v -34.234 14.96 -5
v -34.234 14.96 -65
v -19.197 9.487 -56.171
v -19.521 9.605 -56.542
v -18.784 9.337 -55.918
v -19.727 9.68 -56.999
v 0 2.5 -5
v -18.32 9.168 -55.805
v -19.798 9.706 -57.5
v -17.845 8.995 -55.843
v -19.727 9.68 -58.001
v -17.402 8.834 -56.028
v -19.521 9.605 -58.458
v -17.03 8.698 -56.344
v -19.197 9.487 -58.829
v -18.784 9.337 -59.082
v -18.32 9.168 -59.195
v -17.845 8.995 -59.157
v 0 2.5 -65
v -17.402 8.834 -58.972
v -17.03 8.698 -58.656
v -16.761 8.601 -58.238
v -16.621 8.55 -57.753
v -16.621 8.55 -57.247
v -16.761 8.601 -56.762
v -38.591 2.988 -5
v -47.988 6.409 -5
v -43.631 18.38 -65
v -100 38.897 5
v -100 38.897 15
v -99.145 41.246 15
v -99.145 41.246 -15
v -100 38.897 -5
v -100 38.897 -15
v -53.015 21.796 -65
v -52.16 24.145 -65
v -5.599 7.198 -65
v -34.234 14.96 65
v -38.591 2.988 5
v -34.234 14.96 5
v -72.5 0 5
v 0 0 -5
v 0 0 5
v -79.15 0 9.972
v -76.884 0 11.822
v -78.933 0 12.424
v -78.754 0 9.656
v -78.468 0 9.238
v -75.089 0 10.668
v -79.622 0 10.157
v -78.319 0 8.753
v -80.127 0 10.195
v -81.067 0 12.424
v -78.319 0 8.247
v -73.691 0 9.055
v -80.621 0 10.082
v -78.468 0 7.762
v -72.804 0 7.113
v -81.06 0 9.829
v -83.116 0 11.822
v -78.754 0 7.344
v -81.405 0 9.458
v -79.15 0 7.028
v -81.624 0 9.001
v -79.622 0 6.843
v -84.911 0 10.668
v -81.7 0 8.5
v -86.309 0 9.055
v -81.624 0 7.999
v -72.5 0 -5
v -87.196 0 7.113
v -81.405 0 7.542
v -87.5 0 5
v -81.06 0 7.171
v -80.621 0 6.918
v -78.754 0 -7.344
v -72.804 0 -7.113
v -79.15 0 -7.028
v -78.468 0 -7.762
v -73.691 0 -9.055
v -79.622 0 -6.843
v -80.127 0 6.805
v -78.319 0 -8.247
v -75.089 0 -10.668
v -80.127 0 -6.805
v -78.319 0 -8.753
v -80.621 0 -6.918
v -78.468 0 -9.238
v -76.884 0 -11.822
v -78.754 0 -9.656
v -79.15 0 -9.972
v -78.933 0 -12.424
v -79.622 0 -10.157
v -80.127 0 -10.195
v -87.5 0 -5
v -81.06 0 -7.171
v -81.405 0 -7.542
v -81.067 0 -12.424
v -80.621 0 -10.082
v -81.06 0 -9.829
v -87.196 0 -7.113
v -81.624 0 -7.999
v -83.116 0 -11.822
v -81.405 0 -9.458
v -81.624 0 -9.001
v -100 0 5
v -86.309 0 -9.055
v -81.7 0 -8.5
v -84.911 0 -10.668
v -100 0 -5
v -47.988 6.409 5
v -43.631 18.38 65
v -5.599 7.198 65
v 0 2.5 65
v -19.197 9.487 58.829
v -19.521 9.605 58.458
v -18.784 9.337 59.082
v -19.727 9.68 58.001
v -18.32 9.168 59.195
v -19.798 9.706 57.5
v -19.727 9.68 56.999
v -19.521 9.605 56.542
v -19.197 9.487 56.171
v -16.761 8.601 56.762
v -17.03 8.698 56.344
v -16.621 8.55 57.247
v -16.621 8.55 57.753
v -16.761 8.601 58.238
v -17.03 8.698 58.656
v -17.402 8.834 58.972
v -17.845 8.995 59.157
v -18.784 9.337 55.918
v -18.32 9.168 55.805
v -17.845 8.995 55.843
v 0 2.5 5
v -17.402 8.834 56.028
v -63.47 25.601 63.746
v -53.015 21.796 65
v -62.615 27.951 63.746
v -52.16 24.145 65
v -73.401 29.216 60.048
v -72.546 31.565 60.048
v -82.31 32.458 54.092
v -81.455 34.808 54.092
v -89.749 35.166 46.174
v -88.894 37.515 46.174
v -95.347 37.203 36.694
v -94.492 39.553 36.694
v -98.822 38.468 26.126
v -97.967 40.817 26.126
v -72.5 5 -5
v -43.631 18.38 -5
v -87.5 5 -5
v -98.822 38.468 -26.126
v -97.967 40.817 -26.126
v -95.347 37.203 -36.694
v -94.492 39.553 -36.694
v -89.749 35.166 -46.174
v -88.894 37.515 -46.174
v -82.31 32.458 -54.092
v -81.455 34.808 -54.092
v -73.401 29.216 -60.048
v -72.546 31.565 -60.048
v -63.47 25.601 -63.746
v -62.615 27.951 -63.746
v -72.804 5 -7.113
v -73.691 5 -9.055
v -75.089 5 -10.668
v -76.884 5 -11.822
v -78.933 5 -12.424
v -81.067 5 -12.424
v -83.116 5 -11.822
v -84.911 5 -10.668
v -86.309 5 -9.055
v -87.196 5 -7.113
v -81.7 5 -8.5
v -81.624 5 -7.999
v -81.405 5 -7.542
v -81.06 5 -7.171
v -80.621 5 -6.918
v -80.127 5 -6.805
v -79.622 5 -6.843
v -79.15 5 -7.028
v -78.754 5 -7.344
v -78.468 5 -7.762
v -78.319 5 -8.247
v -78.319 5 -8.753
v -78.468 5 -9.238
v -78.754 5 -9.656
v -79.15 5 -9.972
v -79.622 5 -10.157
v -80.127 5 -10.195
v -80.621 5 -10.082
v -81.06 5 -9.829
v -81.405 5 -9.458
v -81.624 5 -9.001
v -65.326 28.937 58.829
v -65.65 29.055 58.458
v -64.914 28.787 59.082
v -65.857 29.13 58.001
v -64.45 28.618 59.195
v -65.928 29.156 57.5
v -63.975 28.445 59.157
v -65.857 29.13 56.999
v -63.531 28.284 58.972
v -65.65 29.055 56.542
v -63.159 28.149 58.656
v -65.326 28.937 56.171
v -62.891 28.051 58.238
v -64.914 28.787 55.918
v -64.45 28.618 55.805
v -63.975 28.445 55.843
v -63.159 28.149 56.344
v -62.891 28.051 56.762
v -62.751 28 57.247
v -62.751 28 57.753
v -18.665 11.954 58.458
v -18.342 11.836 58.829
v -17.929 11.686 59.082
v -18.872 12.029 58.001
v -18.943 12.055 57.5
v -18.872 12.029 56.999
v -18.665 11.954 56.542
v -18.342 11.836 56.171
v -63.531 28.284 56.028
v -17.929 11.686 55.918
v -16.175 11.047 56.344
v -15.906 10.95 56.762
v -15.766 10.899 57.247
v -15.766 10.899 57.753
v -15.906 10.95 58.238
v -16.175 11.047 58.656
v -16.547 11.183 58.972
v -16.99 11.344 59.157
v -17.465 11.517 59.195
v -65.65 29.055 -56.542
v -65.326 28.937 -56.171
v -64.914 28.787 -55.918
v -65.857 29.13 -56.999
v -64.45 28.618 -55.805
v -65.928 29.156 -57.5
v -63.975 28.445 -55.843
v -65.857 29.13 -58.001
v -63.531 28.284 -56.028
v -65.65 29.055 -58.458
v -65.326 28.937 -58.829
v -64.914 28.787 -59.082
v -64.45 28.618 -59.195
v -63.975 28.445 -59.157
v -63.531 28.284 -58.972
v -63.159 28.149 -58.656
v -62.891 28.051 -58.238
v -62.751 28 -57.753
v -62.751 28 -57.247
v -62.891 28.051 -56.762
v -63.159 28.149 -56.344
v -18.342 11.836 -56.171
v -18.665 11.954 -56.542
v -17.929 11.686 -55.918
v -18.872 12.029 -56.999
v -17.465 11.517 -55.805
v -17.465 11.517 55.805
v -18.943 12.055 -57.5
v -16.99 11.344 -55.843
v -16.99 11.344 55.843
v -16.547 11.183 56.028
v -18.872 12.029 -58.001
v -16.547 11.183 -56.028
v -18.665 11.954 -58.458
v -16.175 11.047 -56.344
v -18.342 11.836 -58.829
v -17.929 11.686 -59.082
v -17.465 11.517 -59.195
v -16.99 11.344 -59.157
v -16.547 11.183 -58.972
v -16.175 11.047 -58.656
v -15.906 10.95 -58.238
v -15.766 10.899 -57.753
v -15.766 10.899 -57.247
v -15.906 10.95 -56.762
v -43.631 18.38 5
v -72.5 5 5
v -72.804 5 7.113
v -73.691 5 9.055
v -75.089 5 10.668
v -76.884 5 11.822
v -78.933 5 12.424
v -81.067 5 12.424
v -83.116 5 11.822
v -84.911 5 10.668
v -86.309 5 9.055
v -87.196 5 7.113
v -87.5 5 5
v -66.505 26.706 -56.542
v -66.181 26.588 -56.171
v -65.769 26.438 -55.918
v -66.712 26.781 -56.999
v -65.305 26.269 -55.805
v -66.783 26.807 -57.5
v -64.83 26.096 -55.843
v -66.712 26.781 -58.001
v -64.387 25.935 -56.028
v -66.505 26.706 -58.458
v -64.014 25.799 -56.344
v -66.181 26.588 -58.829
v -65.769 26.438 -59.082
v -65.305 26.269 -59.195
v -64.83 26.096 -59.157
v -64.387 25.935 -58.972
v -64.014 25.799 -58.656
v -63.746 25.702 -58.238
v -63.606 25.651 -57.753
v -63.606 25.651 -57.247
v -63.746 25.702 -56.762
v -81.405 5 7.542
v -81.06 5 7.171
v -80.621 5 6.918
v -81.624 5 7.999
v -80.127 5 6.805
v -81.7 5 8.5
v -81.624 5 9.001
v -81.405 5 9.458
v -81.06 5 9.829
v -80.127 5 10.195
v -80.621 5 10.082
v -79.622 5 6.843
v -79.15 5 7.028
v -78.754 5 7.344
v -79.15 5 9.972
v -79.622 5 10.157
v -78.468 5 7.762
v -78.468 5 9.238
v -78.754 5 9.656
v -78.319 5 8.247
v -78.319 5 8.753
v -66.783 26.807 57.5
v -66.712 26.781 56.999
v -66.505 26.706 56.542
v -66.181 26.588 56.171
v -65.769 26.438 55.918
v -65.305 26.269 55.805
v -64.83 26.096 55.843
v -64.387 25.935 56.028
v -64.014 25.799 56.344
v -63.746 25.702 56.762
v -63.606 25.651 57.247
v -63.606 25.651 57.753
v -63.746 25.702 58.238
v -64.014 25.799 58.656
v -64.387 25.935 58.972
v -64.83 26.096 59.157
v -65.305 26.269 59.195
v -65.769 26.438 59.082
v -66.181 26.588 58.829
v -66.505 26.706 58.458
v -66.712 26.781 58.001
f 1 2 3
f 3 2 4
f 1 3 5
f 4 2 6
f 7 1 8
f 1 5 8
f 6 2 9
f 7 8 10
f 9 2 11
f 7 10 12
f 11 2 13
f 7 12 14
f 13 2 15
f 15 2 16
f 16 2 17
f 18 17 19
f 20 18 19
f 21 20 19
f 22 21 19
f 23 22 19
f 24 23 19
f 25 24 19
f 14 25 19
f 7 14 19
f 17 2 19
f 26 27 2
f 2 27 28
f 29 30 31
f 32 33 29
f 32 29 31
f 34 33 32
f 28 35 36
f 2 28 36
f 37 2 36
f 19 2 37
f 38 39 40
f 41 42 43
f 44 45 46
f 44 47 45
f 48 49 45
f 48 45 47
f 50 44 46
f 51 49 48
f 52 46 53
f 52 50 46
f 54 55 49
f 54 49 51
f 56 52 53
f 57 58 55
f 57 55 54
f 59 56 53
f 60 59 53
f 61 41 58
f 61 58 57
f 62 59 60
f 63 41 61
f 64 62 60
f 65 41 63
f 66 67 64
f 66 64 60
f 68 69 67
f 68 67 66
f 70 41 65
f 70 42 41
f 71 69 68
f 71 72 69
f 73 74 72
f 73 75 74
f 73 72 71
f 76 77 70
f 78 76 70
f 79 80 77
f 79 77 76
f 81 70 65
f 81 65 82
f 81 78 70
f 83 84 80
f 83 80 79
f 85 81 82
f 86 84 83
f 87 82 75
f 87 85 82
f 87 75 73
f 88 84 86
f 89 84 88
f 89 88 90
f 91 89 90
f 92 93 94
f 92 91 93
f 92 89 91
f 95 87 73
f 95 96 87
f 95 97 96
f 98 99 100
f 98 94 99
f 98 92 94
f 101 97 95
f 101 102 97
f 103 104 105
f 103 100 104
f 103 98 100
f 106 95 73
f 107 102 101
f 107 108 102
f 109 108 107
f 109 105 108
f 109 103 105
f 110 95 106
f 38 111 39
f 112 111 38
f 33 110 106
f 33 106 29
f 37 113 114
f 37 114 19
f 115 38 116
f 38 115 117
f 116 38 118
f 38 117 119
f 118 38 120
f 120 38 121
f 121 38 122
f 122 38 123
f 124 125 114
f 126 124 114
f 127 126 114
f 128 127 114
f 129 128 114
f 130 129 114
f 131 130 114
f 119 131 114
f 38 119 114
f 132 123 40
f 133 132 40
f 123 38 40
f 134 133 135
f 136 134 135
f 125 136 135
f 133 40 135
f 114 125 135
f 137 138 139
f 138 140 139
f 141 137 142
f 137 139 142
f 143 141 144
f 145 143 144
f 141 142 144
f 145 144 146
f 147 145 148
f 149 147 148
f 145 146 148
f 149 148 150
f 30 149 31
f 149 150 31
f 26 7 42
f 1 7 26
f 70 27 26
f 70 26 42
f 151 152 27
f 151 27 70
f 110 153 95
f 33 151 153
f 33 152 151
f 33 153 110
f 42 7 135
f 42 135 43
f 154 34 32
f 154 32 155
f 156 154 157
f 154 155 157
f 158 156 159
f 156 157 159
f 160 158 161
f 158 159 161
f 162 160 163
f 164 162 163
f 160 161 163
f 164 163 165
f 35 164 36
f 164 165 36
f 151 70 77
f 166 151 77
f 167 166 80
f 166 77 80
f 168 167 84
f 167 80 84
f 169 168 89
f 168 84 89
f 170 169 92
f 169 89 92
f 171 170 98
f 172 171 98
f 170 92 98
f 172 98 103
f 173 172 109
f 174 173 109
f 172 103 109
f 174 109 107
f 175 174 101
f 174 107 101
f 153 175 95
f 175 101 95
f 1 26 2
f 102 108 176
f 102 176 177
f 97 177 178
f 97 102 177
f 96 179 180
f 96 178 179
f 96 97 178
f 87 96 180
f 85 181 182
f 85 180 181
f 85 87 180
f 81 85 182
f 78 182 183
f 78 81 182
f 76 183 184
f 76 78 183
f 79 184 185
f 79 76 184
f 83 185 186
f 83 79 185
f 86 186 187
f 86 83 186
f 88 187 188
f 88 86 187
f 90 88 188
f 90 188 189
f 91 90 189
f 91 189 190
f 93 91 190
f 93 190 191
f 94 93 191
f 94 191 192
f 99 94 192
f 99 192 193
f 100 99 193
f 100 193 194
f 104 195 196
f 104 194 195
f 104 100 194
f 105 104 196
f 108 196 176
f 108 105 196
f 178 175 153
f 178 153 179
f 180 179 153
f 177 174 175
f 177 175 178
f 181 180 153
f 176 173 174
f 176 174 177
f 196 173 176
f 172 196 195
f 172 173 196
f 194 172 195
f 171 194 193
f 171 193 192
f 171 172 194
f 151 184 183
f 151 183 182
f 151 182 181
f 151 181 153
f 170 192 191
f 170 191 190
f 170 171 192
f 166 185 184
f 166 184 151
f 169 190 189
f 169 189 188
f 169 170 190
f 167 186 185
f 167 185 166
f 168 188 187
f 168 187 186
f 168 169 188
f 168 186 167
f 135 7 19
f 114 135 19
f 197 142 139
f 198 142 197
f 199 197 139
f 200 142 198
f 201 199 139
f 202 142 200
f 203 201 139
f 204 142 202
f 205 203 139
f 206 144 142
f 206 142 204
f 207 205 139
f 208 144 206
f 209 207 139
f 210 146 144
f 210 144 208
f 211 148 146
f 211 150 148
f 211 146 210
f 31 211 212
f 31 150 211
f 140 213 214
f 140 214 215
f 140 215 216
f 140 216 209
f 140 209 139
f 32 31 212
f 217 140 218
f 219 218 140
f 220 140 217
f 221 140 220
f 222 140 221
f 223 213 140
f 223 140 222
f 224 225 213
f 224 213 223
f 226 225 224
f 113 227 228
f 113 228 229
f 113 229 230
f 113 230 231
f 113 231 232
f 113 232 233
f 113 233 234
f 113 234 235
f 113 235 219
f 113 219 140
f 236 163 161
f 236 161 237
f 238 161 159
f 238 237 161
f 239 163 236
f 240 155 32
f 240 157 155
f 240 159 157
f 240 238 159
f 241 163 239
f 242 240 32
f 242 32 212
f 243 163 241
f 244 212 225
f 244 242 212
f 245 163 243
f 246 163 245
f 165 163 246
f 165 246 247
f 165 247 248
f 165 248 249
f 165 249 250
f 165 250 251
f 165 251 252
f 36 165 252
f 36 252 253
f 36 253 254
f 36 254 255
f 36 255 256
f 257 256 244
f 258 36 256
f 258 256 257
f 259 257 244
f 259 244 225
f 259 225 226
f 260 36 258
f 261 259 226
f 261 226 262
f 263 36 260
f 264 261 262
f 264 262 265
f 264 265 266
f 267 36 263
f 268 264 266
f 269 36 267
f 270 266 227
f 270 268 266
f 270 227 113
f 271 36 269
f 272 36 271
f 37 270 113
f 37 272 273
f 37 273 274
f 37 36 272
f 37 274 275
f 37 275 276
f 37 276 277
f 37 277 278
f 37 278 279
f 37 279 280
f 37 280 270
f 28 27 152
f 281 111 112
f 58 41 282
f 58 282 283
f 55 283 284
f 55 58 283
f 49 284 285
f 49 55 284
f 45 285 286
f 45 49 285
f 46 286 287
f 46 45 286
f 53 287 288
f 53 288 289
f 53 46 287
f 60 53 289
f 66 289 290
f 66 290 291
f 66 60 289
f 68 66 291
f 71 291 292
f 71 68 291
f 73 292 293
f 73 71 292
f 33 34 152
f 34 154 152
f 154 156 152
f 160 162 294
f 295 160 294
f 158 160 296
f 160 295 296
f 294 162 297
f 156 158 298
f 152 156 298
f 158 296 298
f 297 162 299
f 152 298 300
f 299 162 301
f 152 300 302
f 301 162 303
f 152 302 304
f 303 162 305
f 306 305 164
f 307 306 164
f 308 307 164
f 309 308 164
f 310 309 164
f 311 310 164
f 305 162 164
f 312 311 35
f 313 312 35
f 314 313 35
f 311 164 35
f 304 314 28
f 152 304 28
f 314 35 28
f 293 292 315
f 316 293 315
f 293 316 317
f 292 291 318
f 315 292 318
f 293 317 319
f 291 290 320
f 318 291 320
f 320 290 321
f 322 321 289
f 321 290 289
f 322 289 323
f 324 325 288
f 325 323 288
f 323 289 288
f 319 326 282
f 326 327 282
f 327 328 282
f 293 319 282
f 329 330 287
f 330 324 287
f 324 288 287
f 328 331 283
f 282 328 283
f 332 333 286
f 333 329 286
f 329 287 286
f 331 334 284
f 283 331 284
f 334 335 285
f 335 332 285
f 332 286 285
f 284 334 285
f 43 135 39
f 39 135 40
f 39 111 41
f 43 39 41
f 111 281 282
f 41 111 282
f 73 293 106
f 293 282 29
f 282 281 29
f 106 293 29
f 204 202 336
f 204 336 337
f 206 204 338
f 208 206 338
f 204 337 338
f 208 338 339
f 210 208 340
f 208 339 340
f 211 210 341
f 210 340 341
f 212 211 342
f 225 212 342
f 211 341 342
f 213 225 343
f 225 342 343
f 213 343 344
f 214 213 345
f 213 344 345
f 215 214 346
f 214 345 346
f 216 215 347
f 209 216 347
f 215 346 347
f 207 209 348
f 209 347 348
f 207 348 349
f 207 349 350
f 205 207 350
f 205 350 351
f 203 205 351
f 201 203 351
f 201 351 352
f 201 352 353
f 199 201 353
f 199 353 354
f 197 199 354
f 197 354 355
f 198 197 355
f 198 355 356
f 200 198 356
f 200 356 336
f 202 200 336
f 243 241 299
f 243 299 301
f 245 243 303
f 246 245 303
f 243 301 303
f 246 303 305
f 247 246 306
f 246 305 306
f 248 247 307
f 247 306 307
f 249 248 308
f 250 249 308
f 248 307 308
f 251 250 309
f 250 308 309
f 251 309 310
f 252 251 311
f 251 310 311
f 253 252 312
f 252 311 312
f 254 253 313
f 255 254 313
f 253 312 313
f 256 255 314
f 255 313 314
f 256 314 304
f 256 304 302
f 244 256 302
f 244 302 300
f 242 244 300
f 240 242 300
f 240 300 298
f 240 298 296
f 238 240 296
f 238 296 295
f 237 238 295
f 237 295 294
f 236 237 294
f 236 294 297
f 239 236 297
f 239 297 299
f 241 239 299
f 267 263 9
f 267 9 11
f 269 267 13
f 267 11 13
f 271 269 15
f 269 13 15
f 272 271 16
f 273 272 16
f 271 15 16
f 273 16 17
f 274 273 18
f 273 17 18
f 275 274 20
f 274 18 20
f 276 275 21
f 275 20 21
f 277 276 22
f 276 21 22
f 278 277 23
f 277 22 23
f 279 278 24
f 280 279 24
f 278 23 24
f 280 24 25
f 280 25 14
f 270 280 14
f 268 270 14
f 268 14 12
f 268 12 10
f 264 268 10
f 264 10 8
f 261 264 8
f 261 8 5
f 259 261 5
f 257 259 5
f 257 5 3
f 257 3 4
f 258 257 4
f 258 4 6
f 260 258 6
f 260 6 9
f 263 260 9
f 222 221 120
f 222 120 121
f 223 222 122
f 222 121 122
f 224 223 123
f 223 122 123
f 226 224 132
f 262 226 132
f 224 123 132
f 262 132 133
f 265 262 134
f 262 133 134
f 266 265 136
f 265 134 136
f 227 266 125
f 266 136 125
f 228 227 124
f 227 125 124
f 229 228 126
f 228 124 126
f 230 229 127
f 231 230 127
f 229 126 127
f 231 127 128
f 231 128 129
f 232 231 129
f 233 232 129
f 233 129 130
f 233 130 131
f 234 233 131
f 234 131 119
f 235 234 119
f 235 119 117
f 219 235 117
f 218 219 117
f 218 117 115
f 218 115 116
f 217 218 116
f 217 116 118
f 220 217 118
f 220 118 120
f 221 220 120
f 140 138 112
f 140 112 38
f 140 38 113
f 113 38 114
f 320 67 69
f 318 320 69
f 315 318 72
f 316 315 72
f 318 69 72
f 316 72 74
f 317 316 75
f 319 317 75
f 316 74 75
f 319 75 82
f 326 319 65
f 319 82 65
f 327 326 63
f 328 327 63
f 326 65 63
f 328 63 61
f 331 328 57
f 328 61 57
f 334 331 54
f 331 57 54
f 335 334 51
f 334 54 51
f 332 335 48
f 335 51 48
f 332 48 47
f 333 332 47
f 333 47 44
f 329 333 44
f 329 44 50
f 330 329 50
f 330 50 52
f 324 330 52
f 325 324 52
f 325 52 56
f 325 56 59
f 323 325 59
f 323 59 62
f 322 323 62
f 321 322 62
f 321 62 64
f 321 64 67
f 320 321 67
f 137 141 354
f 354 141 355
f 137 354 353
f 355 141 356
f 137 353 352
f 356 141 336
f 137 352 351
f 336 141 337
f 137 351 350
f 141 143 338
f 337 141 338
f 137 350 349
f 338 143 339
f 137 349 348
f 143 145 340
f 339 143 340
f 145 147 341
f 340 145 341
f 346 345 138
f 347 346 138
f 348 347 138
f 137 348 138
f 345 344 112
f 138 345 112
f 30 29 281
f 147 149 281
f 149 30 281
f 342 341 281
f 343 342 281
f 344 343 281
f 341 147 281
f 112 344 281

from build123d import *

# Parameters (mm, degrees)
ESTRUSIONE_ESTRUSIONE1_DEPTH      = 5
ESTRUSIONE_ESTRUSIONE1_DEPTH_BACK = 5
ESTRUSIONE_ESTRUSIONE3_DEPTH      = 5
FORO_PER_VITE_M3_1_D              = 3.4
SCHIZZO26_W                       = 106.417777248
SCHIZZO26_H                       = 130
ESTRUSIONE_ESTRUSIONE5_DEPTH      = 2.5
NERVATURA2_REACH                  = 94.596
SCHIZZO29_WALL_W                  = 248.530633184
SCHIZZO29_WALL_H                  = 10
SMUSSO1_SIZE2                     = 6.868693549
SMUSSO1_SIZE                      = 2.5
RACCORDO1_R                       = 50
FORO_PER_VITE_M3_2_D              = 3.4


with BuildPart() as part:
    # Schizzo1 → Estrusione-Estrusione1 (new, two sides: drawn at the far end of the back side and taken through both)
    with BuildSketch(Plane.XY.offset(-ESTRUSIONE_ESTRUSIONE1_DEPTH_BACK)):
        Polygon((0, 0), (-100, 0), (-100, 38.897023427), (0, 2.5), align=None)
    extrude(amount=ESTRUSIONE_ESTRUSIONE1_DEPTH + ESTRUSIONE_ESTRUSIONE1_DEPTH_BACK)

    # Schizzo18 → Estrusione-Estrusione3 (add)
    with BuildSketch(Plane.XZ):
        with BuildLine():
            Line((-87.5, 5), (-72.5, 5))
            ThreePointArc((-72.5, 5), (-80, 12.5), (-87.5, 5))
        make_face()
    estrusione_estrusione3 = extrude(amount=-ESTRUSIONE_ESTRUSIONE3_DEPTH)

    # Foro per Vite M3-1 (through all)
    with Locations(Plane(origin=(-80, 5, 8.5), x_dir=(1, 0, 0), z_dir=(0, 1, 0))):
        with Locations((0, 0)):
            foro_per_vite_m3_1 = Hole(FORO_PER_VITE_M3_1_D / 2)

    # Specchia2: Estrusione-Estrusione3, Foro per Vite M3-1 across plane
    add(estrusione_estrusione3.mirror(Plane.XY))
    add(foro_per_vite_m3_1.mirror(Plane.XY), mode=Mode.SUBTRACT)

    # Schizzo26 → Estrusione-Estrusione5 (add)
    with BuildSketch(Plane(origin=(0.803484512, 2.207555554, 0), x_dir=(0.9396926207859082, -0.3420201433256694, 0), z_dir=(0.3420201433256694, 0.9396926207859083, 0))):
        with Locations((-54.063938982, 0)):
            Rectangle(SCHIZZO26_W, SCHIZZO26_H)
    extrude(amount=ESTRUSIONE_ESTRUSIONE5_DEPTH)

    # Schizzo29 wall → Nervatura2 (add, up to next)
    with BuildSketch(Plane(origin=(-41.11120737, 10.684369938, 35), x_dir=(0.071039265759, 0.195178778583, 0.978191528849), z_dir=(-0.334561206897, -0.919199361374, 0.207704917825)), mode=Mode.PRIVATE) as nervatura2_sk1:
        Rectangle(SCHIZZO29_WALL_W, SCHIZZO29_WALL_H)
    nervatura2_tool1 = extrude(nervatura2_sk1.sketch, amount=-NERVATURA2_REACH, mode=Mode.PRIVATE) - part.part
    nervatura2 = nervatura2_tool1.solids().sort_by_distance((-41.11120737, 10.684369938, 35))[0]
    add(nervatura2)

    # Specchia3: Nervatura2 across plane
    add(nervatura2.mirror(Plane.XY))

    # Smusso1
    smusso1_edges = [part.edges().sort_by_distance(p)[0] for p in [
        (0.855050358, 4.849231552, 0),
    ]]
    smusso1_side = [part.faces().sort_by_distance(p)[0] for p in [
        (0.837949351, 4.802246921, 0),
    ]]
    chamfer(smusso1_edges, length=SMUSSO1_SIZE - 0.0001, length2=SMUSSO1_SIZE2 - 0.0001, reference=smusso1_side[0])  # a hair under: the kernel refuses the full size

    # Raccordo1
    raccordo1_edges = [part.edges().sort_by_distance(p)[0] for p in [
        (-99.572474821, 40.071639203, -65),
        (-99.572474821, 40.071639203, 65),
    ]]
    fillet(raccordo1_edges, radius=RACCORDO1_R)

    # Foro per Vite M3-2 (through all)
    with Locations(Plane(origin=(1.65853487, 4.556787106, 0), x_dir=(0.9396926207859082, -0.3420201433256695, 0), z_dir=(0.3420201433256695, 0.9396926207859082, 0))):
        with Locations((-70.223743907, 57.5), (-70.223743907, -57.5), (-20.223743907, -57.5), (-20.223743907, 57.5)):
            Hole(FORO_PER_VITE_M3_2_D / 2)


solid = part.part
